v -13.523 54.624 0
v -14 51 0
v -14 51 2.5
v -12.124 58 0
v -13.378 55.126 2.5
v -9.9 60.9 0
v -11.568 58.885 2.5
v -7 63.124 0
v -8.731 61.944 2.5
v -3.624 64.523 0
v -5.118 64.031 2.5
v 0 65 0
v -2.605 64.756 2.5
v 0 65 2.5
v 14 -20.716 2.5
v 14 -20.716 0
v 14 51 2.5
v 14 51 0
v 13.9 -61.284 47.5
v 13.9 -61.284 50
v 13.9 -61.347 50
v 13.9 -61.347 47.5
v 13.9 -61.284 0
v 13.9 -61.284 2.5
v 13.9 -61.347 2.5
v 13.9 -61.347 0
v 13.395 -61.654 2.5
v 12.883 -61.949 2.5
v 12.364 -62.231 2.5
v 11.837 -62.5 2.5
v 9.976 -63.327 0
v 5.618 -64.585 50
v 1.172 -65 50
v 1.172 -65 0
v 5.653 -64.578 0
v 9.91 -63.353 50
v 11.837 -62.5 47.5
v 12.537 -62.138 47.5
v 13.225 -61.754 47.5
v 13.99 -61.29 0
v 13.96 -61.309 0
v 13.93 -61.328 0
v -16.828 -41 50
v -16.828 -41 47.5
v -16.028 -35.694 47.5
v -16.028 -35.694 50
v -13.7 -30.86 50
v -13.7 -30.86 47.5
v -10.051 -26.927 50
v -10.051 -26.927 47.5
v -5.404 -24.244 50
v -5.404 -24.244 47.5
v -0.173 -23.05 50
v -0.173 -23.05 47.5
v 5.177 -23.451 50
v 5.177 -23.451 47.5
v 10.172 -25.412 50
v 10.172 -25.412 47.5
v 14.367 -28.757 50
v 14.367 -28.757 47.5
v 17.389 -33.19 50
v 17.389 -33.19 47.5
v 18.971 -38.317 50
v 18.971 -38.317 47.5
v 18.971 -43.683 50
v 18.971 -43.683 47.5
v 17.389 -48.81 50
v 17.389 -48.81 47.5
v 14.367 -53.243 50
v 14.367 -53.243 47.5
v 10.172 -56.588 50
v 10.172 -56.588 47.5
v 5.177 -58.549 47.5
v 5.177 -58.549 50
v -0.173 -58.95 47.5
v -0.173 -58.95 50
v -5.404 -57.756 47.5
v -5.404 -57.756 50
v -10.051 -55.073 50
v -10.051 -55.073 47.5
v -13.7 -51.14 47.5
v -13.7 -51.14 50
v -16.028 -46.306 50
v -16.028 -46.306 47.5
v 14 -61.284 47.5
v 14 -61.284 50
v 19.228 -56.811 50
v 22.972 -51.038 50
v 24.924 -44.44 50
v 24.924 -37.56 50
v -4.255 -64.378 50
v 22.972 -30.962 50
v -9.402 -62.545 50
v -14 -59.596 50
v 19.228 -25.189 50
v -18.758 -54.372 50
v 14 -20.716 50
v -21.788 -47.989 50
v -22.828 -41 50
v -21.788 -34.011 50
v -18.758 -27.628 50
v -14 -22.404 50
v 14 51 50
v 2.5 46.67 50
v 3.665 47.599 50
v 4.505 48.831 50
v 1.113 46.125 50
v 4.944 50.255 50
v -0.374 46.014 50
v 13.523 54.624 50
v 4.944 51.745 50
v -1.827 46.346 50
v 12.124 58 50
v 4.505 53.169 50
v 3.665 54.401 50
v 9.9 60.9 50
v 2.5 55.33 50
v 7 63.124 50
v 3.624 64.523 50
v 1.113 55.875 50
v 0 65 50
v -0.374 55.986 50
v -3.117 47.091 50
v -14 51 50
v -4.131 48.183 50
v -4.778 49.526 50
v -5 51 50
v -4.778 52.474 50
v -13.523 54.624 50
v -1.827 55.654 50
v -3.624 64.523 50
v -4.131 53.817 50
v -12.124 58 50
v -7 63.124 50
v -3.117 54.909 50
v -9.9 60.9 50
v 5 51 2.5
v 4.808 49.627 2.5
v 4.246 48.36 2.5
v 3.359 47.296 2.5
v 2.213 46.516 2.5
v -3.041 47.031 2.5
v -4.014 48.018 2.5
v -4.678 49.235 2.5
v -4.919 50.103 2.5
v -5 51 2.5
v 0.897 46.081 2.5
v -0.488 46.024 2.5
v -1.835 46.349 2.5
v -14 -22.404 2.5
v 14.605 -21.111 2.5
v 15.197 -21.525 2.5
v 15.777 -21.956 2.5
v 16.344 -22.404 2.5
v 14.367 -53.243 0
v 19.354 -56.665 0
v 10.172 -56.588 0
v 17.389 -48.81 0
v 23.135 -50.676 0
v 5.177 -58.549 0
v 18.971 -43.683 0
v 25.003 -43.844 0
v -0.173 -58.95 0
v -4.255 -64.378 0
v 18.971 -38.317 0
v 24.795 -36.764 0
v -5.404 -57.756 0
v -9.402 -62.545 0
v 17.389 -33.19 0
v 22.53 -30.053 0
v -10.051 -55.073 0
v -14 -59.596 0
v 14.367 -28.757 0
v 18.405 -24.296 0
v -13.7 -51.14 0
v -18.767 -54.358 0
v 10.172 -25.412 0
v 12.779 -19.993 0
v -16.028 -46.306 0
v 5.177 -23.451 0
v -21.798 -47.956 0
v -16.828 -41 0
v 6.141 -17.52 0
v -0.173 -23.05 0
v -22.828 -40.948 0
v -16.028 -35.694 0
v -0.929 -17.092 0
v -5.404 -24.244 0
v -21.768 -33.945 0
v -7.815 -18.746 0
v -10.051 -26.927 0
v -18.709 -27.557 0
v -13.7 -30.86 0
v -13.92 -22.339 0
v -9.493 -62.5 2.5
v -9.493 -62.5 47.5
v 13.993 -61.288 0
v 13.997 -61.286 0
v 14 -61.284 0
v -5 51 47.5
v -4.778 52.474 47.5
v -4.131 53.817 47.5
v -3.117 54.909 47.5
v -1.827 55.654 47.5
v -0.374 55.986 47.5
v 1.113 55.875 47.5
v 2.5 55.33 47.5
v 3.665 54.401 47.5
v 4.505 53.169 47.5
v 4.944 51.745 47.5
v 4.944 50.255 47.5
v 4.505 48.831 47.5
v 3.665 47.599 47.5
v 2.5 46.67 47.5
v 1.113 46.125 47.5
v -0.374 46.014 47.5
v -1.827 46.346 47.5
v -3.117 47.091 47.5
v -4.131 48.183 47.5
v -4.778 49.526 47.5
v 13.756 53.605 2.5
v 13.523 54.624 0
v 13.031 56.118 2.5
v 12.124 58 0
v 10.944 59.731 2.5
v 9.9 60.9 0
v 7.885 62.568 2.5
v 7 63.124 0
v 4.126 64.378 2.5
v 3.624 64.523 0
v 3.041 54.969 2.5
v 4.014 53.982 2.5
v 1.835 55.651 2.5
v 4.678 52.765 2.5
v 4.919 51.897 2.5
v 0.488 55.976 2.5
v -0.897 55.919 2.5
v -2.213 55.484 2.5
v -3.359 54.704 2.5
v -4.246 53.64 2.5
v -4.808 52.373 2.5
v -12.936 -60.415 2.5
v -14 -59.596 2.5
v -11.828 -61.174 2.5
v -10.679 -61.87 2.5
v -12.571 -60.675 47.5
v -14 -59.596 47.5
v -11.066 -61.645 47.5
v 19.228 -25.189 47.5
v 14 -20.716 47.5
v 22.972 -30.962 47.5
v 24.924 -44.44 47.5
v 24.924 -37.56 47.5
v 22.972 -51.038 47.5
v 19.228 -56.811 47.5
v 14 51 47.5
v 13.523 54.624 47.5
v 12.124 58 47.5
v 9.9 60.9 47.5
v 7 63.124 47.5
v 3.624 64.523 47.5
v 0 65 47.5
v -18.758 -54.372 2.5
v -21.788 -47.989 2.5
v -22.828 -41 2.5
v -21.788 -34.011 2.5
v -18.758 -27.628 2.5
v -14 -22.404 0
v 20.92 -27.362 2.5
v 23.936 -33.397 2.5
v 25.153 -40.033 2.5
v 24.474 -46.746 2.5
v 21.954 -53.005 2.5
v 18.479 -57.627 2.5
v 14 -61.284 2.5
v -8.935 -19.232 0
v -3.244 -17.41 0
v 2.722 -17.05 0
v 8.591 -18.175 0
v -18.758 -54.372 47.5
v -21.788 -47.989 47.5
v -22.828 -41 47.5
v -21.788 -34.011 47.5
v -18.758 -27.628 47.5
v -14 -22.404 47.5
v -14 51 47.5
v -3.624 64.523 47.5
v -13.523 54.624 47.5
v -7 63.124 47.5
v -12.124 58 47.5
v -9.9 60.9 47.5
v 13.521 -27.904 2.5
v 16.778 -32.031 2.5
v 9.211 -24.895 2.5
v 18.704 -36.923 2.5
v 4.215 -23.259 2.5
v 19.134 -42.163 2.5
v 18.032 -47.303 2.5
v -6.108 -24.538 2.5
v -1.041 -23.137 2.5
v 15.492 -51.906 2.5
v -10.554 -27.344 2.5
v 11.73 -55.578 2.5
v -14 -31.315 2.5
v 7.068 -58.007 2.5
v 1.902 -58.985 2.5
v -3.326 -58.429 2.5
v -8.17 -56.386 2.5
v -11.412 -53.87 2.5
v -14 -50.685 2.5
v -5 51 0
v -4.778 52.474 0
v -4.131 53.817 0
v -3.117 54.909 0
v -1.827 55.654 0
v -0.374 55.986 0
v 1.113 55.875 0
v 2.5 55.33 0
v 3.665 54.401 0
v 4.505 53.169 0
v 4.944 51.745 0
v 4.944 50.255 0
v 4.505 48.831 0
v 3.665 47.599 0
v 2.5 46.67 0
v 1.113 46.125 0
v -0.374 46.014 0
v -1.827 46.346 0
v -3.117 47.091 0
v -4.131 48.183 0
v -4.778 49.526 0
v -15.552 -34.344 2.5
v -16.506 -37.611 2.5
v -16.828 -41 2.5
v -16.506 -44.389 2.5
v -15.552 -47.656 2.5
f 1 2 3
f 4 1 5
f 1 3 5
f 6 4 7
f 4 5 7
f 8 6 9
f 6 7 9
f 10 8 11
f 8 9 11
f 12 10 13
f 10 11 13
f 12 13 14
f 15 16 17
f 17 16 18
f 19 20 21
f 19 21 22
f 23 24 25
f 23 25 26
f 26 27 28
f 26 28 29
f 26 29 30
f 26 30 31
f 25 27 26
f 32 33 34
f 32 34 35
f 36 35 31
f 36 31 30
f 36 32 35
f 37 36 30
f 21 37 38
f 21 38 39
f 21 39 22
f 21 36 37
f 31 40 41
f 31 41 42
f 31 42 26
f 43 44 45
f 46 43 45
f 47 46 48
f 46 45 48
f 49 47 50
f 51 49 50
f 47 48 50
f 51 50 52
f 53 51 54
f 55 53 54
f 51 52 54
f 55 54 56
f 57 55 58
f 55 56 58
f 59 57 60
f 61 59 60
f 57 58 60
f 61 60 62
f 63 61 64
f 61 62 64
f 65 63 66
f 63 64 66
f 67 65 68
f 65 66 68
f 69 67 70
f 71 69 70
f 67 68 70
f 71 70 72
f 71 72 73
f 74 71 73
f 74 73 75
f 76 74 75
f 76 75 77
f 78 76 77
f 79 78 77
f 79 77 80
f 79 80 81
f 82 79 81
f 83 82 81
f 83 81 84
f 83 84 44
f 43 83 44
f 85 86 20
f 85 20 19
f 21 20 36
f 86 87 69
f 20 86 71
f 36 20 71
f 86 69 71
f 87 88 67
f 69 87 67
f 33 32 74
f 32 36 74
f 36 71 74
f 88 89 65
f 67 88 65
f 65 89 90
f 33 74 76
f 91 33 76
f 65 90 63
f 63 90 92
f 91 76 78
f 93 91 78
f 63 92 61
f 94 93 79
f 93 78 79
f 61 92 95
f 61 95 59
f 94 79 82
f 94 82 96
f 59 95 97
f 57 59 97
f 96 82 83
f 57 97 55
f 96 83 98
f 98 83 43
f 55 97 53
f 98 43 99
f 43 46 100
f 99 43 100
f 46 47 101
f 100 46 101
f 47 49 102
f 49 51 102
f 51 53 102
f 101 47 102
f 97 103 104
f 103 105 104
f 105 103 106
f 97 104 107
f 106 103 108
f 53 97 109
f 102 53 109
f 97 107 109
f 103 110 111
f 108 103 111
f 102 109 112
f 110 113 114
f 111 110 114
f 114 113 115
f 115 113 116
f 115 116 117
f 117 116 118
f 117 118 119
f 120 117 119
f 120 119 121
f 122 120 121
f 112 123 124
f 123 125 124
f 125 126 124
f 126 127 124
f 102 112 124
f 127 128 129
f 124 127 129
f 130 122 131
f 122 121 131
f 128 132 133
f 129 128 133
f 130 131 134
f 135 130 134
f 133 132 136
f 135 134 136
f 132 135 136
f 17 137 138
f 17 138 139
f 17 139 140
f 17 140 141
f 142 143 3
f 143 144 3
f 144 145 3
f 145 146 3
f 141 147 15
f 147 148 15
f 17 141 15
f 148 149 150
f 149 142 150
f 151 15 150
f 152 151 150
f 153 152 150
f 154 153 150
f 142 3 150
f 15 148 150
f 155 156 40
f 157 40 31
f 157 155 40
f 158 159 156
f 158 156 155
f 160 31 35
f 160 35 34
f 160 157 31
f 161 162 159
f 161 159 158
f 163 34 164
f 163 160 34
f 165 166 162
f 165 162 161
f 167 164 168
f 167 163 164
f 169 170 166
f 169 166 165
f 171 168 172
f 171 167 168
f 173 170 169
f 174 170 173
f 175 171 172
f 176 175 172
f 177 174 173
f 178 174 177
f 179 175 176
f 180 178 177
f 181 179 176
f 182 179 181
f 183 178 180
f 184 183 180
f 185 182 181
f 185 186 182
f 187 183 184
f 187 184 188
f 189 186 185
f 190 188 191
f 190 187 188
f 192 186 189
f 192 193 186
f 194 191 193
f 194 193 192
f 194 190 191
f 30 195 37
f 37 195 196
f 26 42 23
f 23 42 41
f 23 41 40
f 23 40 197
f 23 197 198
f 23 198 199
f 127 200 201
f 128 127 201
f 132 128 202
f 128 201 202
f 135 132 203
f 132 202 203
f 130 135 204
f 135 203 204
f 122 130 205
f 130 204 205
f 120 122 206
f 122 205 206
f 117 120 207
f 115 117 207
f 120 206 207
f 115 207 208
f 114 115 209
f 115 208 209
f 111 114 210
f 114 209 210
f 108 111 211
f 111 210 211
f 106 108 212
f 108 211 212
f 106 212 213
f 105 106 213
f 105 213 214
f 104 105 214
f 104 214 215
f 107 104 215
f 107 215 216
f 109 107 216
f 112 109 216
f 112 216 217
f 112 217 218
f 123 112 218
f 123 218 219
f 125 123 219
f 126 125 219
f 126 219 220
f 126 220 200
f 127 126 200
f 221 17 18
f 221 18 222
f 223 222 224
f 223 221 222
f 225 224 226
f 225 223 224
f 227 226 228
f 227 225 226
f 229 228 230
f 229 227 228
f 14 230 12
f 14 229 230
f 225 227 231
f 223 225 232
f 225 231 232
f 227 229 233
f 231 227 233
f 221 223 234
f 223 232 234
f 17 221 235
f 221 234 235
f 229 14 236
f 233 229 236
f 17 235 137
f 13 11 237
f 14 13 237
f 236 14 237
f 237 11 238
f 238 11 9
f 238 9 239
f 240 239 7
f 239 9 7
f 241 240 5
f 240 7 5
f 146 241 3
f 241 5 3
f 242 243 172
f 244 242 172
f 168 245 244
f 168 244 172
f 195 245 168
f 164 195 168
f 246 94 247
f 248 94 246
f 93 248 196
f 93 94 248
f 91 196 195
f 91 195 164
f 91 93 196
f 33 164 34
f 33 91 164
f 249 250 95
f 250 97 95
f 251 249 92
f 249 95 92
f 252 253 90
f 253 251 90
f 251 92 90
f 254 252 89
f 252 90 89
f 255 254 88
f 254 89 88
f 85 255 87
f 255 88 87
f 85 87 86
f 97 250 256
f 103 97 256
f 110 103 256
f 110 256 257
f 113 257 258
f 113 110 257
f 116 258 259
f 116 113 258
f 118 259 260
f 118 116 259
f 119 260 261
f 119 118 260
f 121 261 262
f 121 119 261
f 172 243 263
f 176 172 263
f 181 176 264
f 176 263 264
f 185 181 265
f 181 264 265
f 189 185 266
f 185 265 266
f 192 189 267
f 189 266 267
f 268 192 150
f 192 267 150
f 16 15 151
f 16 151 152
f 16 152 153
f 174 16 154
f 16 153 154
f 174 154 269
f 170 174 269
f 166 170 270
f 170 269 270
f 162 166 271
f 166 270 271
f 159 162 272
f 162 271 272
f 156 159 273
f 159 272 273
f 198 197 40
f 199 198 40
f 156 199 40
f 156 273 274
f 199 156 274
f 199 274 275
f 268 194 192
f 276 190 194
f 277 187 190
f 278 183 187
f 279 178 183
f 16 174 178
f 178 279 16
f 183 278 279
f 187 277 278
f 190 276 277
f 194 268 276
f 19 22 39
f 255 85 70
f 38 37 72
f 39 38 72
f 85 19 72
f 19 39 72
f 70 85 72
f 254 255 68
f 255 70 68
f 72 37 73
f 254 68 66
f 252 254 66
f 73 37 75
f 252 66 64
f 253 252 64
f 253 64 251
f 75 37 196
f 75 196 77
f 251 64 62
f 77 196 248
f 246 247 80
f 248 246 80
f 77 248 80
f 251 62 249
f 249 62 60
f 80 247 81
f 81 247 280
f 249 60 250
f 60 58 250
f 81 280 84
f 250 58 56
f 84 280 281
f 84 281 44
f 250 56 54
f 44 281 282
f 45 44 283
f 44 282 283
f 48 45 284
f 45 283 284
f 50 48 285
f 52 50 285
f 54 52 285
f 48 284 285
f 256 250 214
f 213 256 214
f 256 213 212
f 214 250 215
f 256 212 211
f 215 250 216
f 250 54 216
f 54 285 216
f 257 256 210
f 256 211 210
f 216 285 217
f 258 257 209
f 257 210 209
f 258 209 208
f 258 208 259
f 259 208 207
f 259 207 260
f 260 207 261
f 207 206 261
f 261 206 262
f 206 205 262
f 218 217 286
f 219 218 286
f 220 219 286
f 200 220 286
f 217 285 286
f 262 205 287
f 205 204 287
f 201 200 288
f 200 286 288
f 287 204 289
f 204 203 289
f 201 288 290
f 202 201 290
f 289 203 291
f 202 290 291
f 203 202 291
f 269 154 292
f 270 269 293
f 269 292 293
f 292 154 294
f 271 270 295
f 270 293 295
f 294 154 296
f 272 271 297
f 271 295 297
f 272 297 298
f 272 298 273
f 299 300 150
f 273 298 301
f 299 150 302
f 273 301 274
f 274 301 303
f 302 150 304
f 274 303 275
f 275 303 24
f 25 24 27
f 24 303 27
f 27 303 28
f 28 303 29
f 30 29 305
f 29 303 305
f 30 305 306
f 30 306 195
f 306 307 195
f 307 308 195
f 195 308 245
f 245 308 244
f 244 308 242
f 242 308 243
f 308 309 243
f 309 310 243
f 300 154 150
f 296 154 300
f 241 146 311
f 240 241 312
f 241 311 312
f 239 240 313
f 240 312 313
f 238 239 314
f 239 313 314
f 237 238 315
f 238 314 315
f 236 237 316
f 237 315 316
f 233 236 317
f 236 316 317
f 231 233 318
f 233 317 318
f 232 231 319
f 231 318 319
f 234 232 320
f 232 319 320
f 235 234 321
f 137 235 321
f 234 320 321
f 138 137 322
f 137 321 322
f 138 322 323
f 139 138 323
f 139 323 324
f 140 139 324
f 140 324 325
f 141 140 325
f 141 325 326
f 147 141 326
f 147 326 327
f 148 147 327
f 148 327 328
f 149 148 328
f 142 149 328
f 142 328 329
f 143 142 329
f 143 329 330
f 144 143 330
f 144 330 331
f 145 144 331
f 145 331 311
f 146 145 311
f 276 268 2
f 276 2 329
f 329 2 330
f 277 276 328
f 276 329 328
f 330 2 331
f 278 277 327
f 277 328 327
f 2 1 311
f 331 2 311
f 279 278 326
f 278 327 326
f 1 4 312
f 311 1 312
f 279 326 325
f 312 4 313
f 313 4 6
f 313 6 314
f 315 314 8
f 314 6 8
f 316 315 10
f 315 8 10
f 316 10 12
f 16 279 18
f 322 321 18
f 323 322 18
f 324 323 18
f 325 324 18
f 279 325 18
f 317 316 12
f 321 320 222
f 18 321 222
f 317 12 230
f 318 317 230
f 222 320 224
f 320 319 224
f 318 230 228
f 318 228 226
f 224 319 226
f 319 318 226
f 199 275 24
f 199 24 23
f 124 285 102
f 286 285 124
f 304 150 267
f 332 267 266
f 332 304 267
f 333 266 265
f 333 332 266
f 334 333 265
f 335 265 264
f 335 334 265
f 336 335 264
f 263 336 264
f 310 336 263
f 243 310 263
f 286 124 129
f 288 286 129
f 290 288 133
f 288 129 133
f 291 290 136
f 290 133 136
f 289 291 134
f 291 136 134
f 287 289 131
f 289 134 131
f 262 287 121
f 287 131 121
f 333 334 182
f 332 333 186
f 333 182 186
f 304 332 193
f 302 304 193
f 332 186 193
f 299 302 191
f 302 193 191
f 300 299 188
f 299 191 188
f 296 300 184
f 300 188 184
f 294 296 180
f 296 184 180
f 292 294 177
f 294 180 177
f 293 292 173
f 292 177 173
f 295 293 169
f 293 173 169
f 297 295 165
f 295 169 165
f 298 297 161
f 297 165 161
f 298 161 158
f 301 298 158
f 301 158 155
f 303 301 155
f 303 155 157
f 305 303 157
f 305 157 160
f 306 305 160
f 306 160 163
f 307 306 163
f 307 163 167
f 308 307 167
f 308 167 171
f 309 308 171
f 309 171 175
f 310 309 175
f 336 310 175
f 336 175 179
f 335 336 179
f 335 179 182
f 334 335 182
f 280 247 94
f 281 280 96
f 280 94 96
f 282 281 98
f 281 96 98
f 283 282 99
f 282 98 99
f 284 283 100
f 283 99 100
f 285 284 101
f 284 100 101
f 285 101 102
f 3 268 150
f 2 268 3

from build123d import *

# Parameters (mm, degrees)
ESBO_O1_W                  = 28
ESBO_O1_H                  = 130
RESSALTO_EXTRUS_O1_DEPTH   = 50
RESSALTO_EXTRUS_O2_START   = -50
ESBO_O2_R                  = 24
RESSALTO_EXTRUS_O2_DEPTH   = 50.000012
CORTE_EXTRUS_O2_DEPTH      = 86.782476988
CORTE_EXTRUS_O2_DEPTH_BACK = 86.782476988
ESBO_O6_W                  = 50
ESBO_O6_H                  = 3.715924279
CORTE_EXTRUS_O6_DEPTH      = 0.1
FILETE1_R                  = 14
CORTE_EXTRUS_O7_DEPTH      = 91.881514017
CORTE_EXTRUS_O8_DEPTH      = 91.881514017
ESBO_O12_R                 = 5
CORTE_EXTRUS_O10_DEPTH     = 86.782469994
ESBO_O13_R                 = 18
CORTE_EXTRUS_O11_DEPTH     = 86.782476988


with BuildPart() as part:
    # Esboço1 → Ressalto-extrusão1 (new body)
    with BuildSketch(Plane.XY):
        Rectangle(ESBO_O1_W, ESBO_O1_H)
    extrude(amount=RESSALTO_EXTRUS_O1_DEPTH)

    # Esboço2 → Ressalto-extrusão2 (add)
    with BuildSketch(Plane(origin=(0, 0, 0), x_dir=(-1, 0, 0), z_dir=(0, 0, -1)).offset(RESSALTO_EXTRUS_O2_START)):
        with Locations((-1.172051133, -41)):
            Circle(ESBO_O2_R)
    extrude(amount=RESSALTO_EXTRUS_O2_DEPTH)

    # Esboço5 → Corte-extrusão2 (cut, two sides: drawn at the far end of the back side and taken through both)
    with BuildSketch(Plane(origin=(0, 0, -1.2e-05), x_dir=(-1, 0, 0), z_dir=(0, 0, -1)).offset(-CORTE_EXTRUS_O2_DEPTH_BACK)):
        with BuildLine():
            ThreePointArc((-1.172051133, -65), (-7.844009292, -64.053957889), (-13.989971335, -61.290414528))
            Line((-13.989971335, -61.290414528), (-14, -65))
            Line((-14, -65), (-1.172051133, -65))
        make_face()
        with BuildLine():
            ThreePointArc((14, -59.595936771), (6.880821568, -63.608654123), (-1.172051133, -65))
            Line((-1.172051133, -65), (14, -65))
            Line((14, -65), (14, -59.595936771))
        make_face()
    extrude(amount=CORTE_EXTRUS_O2_DEPTH + CORTE_EXTRUS_O2_DEPTH_BACK, mode=Mode.SUBTRACT)

    # Esboço6 → Corte-extrusão6 (cut)
    with BuildSketch(Plane(origin=(14, 0, 0), x_dir=(0, 0, -1), z_dir=(1, 0, 0))):
        with Locations((-25, -63.14203786)):
            Rectangle(ESBO_O6_W, ESBO_O6_H)
    extrude(amount=-CORTE_EXTRUS_O6_DEPTH, mode=Mode.SUBTRACT)

    # Filete1
    filete1_edges = [part.edges().sort_by_distance(p)[0] for p in [
        (14, 65, 25),
        (-14, 65, 25),
    ]]
    fillet(filete1_edges, radius=FILETE1_R - 0.0001)  # a hair under: the kernel refuses the full size

    # Esboço8 → Corte-extrusão7 (cut, through all)
    with BuildSketch(Plane.ZY.offset(14)):
        Polygon((47.5, -22.404063229), (2.499991932, -22.404063229), (2.499988231, -62.5), (47.5, -62.5), align=None)
        Polygon((2.499998708, 51), (2.499991932, -22.404063229), (47.5, -22.404063229), (47.5, 51), align=None)
        Polygon((2.5, 64.999999769), (2.499998708, 51), (47.5, 51), (47.5, 65), align=None)
    extrude(amount=-CORTE_EXTRUS_O7_DEPTH, mode=Mode.SUBTRACT)

    # Esboço9 → Corte-extrusão8 (cut, through all)
    with BuildSketch(Plane(origin=(-14, 0, 0), x_dir=(0, 0, -1), z_dir=(1, 0, 0))):
        Polygon((-2.499991932, -22.404063229), (-2.499988499, -59.595936771), (-47.5, -59.595936771), (-47.5, -22.404063229), align=None)
    extrude(amount=-CORTE_EXTRUS_O8_DEPTH, mode=Mode.SUBTRACT)

    # Esboço12 → Corte-extrusão10 (cut, through all)
    with BuildSketch(Plane(origin=(0, 0, 0), x_dir=(-1, 0, 0), z_dir=(0, 0, -1))):
        with Locations((0, 51)):
            Circle(ESBO_O12_R)
    extrude(amount=-CORTE_EXTRUS_O10_DEPTH, mode=Mode.SUBTRACT)

    # Esboço13 → Corte-extrusão11 (cut, through all)
    with BuildSketch(Plane(origin=(0, 0, -1.2e-05), x_dir=(-1, 0, 0), z_dir=(0, 0, -1))):
        with Locations((-1.172051133, -41)):
            Circle(ESBO_O13_R)
    extrude(amount=-CORTE_EXTRUS_O11_DEPTH, mode=Mode.SUBTRACT)


solid = part.part
